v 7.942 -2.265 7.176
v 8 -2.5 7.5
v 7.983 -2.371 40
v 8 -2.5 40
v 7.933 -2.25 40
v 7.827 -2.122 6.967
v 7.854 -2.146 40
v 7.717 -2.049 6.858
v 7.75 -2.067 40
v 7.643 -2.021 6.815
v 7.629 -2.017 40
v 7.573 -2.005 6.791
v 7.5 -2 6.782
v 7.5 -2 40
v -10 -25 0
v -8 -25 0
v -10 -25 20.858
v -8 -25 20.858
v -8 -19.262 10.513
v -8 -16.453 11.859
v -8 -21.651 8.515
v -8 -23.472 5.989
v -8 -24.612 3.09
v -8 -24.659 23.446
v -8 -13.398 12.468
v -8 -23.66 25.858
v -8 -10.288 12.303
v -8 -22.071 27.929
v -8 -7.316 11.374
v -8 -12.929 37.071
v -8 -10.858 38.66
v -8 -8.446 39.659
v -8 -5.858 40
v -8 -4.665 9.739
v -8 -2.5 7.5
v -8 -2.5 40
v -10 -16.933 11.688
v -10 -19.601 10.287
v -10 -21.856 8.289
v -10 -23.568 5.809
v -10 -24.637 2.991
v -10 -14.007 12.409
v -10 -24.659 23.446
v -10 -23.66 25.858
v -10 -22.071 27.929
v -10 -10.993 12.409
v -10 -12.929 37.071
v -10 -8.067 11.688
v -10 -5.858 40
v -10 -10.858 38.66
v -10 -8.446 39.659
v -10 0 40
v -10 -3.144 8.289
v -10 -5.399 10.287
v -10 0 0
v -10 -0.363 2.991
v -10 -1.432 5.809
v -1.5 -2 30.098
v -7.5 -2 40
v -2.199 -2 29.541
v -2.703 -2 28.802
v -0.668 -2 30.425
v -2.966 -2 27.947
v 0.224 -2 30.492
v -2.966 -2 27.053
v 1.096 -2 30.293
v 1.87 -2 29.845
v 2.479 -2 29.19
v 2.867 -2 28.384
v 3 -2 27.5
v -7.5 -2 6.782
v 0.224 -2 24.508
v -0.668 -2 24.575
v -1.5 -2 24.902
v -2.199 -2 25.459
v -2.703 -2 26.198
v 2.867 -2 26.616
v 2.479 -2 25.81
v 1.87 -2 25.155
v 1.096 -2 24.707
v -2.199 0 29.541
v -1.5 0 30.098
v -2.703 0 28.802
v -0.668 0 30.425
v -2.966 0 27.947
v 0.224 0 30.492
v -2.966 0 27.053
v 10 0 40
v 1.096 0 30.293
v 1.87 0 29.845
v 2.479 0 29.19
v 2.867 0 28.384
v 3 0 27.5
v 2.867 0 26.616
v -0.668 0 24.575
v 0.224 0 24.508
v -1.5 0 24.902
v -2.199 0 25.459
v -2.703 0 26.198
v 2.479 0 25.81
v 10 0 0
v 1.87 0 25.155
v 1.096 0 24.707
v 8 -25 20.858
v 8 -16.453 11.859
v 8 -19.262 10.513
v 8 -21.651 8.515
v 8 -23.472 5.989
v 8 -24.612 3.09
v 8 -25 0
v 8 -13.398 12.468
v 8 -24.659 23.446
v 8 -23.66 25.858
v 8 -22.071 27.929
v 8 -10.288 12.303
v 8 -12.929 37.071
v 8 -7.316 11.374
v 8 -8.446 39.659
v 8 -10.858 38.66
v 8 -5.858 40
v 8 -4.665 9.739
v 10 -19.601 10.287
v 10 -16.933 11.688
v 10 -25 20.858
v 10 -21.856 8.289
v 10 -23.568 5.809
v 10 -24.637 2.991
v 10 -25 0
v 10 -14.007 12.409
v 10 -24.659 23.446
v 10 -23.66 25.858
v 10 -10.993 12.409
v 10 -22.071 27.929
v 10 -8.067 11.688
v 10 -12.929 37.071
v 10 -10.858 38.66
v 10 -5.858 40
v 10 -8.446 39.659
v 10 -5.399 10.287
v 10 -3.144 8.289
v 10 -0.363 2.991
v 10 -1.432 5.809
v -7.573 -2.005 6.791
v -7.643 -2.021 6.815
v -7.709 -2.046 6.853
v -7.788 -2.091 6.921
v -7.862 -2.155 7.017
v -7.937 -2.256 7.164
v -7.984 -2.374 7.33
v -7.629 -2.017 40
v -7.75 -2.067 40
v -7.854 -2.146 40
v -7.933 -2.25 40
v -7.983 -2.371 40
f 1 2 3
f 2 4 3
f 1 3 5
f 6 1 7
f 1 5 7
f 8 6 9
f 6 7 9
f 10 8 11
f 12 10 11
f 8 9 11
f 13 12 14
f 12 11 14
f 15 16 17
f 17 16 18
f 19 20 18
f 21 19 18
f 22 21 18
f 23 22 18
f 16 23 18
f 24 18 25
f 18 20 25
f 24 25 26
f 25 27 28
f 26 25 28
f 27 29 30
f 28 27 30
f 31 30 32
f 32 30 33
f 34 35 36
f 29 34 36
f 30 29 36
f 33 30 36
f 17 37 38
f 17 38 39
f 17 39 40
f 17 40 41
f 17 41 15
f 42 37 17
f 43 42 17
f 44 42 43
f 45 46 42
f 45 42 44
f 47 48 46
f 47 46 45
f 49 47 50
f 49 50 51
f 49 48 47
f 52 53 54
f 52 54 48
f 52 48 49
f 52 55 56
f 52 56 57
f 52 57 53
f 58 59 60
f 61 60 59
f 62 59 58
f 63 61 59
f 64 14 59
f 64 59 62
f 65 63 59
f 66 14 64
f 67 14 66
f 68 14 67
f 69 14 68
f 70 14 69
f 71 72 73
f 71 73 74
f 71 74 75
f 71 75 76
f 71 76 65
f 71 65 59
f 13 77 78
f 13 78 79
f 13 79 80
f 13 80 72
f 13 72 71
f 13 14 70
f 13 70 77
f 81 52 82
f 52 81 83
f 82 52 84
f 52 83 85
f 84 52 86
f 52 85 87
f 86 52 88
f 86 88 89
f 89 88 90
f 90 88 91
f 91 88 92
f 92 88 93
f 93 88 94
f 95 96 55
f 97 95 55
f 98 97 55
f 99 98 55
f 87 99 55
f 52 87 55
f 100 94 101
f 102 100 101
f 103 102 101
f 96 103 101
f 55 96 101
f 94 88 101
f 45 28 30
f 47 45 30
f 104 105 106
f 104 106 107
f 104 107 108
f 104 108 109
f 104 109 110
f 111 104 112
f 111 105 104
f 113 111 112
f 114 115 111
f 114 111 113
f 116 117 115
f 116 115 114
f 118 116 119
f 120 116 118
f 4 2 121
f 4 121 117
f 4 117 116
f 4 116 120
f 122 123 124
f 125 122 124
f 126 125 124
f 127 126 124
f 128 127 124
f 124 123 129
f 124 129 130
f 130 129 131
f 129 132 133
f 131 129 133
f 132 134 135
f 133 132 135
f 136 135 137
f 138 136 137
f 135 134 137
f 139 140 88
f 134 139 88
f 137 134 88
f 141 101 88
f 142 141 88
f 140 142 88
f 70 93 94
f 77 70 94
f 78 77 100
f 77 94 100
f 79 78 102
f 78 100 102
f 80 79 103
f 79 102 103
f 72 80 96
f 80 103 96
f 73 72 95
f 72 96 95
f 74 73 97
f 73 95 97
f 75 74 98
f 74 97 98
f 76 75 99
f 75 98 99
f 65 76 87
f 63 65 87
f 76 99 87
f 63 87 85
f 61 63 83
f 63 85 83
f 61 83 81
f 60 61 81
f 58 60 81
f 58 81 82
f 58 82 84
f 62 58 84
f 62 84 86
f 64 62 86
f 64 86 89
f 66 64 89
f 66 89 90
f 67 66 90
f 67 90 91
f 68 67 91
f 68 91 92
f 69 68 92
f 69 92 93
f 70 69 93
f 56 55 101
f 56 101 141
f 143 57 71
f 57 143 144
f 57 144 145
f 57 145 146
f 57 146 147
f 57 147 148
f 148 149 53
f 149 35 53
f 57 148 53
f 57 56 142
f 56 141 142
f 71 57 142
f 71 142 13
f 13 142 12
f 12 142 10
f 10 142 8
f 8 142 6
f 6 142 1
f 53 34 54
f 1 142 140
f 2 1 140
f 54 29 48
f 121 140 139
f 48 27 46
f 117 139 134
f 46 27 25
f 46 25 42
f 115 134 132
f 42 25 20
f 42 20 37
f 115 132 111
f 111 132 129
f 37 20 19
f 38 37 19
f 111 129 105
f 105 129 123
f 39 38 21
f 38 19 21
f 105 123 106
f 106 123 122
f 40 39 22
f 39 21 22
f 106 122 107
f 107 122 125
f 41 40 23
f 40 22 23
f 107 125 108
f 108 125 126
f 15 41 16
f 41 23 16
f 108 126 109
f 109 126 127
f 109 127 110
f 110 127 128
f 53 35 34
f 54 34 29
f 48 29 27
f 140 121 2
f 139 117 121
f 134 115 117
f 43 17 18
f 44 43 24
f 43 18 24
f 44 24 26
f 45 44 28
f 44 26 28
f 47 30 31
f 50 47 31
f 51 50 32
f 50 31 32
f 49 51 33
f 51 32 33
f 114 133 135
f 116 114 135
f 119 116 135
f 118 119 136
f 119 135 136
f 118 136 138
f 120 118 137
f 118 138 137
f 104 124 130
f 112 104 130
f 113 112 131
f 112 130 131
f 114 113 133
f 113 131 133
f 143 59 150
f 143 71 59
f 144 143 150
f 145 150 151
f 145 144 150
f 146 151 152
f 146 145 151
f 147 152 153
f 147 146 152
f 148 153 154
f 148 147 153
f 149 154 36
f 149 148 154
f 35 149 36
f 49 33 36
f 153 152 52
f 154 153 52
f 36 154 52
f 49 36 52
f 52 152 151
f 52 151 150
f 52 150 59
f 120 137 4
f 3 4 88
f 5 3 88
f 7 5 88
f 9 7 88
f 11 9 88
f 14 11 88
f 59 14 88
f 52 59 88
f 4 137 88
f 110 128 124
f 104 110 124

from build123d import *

# Parameters (mm, degrees)
DODANIE_WYCI_GNI_CIE1_DEPTH = 10
SKORUPA1_T                  = -2
ZAOKR_GLENIE1_R             = 0.5
SZKIC2_R                    = 3
WYTNIJ_WYCI_GNI_CIE1_DEPTH  = 10


with BuildPart() as part:
    # Szkic1 → Dodanie-wyciągnięcie1 (new body, symmetric)
    with BuildSketch(Plane(origin=(0, 0, 0), x_dir=(0, 0, -1), z_dir=(1, 0, 0))):
        with BuildLine():
            Line((0, -25), (-20.857864376, -25))
            ThreePointArc((-20.857864376, -25), (-24.6846987, -24.238795325), (-27.928932188, -22.071067812))
            Line((-27.928932188, -22.071067812), (-37.071067812, -12.928932188))
            ThreePointArc((-37.071067812, -12.928932188), (-39.238795325, -9.6846987), (-40, -5.857864376))
            Line((-40, -5.857864376), (-40, 0))
            Line((-40, 0), (0, 0))
            ThreePointArc((0, 0), (-12.5, -12.5), (0, -25))
        make_face()
    extrude(amount=DODANIE_WYCI_GNI_CIE1_DEPTH, both=True)

    # Skorupa1
    skorupa1_openings = [part.faces().sort_by_distance(p)[0] for p in [
        (0, -25, 10.428932188),
        (0, -23.887164616, 24.539048491),
        (0, -17.5, 32.5),
        (0, -9.539048491, 38.887164616),
        (0, -2.928932188, 40),
        (0, -12.5, 6.25),
    ]]
    offset(amount=SKORUPA1_T, openings=skorupa1_openings, kind=Kind.INTERSECTION)

    # Zaokrąglenie1
    zaokr_glenie1_edges = [part.edges().sort_by_distance(p)[0] for p in [
        (-8, -2, 23.391164992),
        (8, -2, 23.391164992),
    ]]
    fillet(zaokr_glenie1_edges, radius=ZAOKR_GLENIE1_R)

    # Szkic2 → Wytnij-wyciągnięcie1 (cut)
    with BuildSketch(Plane(origin=(0, 0, 0), x_dir=(1, 0, 0), z_dir=(0, 1, 0))):
        with Locations((0, -27.5)):
            Circle(SZKIC2_R)
    extrude(amount=-WYTNIJ_WYCI_GNI_CIE1_DEPTH, mode=Mode.SUBTRACT)


solid = part.part
